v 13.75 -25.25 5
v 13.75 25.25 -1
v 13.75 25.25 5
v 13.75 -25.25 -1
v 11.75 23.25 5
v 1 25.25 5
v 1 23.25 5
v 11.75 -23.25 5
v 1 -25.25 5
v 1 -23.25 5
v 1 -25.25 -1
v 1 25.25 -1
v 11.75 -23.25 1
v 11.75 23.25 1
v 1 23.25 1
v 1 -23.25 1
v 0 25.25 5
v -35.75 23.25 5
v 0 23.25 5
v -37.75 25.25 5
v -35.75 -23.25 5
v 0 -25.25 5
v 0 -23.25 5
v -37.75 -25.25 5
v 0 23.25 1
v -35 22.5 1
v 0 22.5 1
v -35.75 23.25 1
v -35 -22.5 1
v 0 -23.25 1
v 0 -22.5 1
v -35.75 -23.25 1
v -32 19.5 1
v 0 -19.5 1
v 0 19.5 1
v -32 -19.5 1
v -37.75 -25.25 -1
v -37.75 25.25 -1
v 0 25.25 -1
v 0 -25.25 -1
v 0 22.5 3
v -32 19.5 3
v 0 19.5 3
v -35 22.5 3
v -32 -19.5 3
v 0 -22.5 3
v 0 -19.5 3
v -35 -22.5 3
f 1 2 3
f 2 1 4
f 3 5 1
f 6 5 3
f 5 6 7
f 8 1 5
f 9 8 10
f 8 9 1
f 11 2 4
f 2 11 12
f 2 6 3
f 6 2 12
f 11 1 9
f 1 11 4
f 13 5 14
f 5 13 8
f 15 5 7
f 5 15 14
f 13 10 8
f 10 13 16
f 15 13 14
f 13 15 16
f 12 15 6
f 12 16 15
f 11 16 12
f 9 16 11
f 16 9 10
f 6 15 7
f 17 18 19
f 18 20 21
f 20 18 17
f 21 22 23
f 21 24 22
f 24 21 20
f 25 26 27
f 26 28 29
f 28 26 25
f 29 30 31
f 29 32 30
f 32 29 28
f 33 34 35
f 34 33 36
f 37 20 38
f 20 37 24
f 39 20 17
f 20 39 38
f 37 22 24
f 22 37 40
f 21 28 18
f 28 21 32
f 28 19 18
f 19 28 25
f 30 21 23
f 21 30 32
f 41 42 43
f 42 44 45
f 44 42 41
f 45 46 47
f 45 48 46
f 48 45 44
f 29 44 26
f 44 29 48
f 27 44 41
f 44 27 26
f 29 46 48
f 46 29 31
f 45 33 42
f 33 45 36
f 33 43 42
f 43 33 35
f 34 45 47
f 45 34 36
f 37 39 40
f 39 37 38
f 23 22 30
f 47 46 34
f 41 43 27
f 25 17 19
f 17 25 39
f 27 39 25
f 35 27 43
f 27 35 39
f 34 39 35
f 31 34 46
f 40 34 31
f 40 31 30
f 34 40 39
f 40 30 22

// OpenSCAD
// file: controller.scad
w_back = 70;
h_back = 45;
w_controller = 20;
thickness_bottom = 2;
thickness_walls = 2;
h_walls = 4;
gap_backlight = 1.5;

//controller();
//walls();
debug_controller();

module debug_controller() {
    difference(){
        kit_controller();
        translate([-w_controller/2, 0, h_walls/2])
        color("green")
        cube([w_controller, h_back+2*thickness_walls+1+gap_backlight, h_walls*2], center = true);
    }
}


module kit_controller(){
    controller();
    translate([0, 0, h_walls/2])
    walls();
}
module walls(){
    difference(){
        cube([w_controller+2*thickness_walls+gap_backlight, h_back+2*thickness_walls+gap_backlight, thickness_bottom+h_walls], center=true);
        color("red")
        cube([w_controller+gap_backlight, h_back+gap_backlight, thickness_bottom+h_walls+1], center=true);
    }
}

module controller(){
    cube([w_controller+gap_backlight, h_back+gap_backlight, thickness_bottom], center=true);
}
// file: akkum_18650.scad
echo("Rabota Балтачев");

d_akkum = 18;
h_akkum = 65;

twoAcc();

module twoAcc() {
translate([0, -d_akkum/2-1, d_akkum/2+1])
rotate([0, 90, 0])
akkum18650();
    
translate([0, d_akkum/2+1, d_akkum/2+1])
rotate([0, 90, 0])
akkum18650();
    
translate([-33, -10, 0])
import("flexbatter18650x2.stl");
}

module akkum18650(){
    color("purple")
    cylinder(d=d_akkum, h=h_akkum, $fn=32, center = true);
}
// main file
use <akkum_18650.scad>
use <controller.scad>

echo("Работа");

thickness_frame = 4;
thickness_walls = 2;
thickness_bottom = 2;
thickness_top = 2;
width_frame_window = 3;

w_controller = 20;

w_back = 70;
h_back = 45;

thickness_back = 1;
h_walls = 4;
d_wires = 1.2;

d_akkum = 18;
h_akkum = 65;

gap_backlight = 1.5;

//kit_frame();
//translate([w_back/2+w_controller/2+2*thickness_walls, 0, 0])
//kit_controller();

translate([1, 0, 0])
debug_controller();

frame_debug();
//translate([0, 0, thickness_bottom/2+thickness_top/2])
//window_frame();
//walls();

module window_frame(){
    difference(){
        color("green")
        cube([w_back, h_back, thickness_top], center = true);
        color("red")
        cube([w_back-width_frame_window*2, h_back-width_frame_window*2, thickness_top+1], center = true);
    }
}

module frame_debug(){
    difference(){
    kit_frame();
    translate([w_back/2, 0, h_walls-thickness_bottom])
    cube([w_back, h_back+2*thickness_walls+2, h_walls*2], center = true);
    }
}

module kit_frame(){
    bottom();
    translate([0,0,h_walls/2+thickness_bottom/2])
    walls();
    wires();
    translate([0, 0, thickness_bottom/2+thickness_top/2])
    window_frame();
}

module wires() {
    translate([w_back/2, -h_back/2+6, h_walls/2+0.5])
    rotate([0, 90, 0])
    color("red")
    cylinder(d=d_wires, h=25, center=true, $fn=25);
    
    translate([w_back/2, -h_back/2+2, h_walls/2+0.5])
    rotate([0, 90, 0])
    color("black")
    cylinder(d=d_wires, h=25, center=true, $fn=25);
}

module walls(){
    difference(){
        cube([w_back+2*thickness_walls+gap_backlight, h_back+2*thickness_walls+gap_backlight, h_walls], center = true);
        color("red")
        cube([w_back+gap_backlight, h_back+gap_backlight, h_walls+1], center = true);
    }
}
module backlight(){
    color("lightgreen")
    cube([w_back, h_back, thickness_back], center = true);
}

module bottom(){
    cube([w_back+2*thickness_walls+gap_backlight, h_back+2*thickness_walls+gap_backlight, thickness_bottom], center = true);
}
